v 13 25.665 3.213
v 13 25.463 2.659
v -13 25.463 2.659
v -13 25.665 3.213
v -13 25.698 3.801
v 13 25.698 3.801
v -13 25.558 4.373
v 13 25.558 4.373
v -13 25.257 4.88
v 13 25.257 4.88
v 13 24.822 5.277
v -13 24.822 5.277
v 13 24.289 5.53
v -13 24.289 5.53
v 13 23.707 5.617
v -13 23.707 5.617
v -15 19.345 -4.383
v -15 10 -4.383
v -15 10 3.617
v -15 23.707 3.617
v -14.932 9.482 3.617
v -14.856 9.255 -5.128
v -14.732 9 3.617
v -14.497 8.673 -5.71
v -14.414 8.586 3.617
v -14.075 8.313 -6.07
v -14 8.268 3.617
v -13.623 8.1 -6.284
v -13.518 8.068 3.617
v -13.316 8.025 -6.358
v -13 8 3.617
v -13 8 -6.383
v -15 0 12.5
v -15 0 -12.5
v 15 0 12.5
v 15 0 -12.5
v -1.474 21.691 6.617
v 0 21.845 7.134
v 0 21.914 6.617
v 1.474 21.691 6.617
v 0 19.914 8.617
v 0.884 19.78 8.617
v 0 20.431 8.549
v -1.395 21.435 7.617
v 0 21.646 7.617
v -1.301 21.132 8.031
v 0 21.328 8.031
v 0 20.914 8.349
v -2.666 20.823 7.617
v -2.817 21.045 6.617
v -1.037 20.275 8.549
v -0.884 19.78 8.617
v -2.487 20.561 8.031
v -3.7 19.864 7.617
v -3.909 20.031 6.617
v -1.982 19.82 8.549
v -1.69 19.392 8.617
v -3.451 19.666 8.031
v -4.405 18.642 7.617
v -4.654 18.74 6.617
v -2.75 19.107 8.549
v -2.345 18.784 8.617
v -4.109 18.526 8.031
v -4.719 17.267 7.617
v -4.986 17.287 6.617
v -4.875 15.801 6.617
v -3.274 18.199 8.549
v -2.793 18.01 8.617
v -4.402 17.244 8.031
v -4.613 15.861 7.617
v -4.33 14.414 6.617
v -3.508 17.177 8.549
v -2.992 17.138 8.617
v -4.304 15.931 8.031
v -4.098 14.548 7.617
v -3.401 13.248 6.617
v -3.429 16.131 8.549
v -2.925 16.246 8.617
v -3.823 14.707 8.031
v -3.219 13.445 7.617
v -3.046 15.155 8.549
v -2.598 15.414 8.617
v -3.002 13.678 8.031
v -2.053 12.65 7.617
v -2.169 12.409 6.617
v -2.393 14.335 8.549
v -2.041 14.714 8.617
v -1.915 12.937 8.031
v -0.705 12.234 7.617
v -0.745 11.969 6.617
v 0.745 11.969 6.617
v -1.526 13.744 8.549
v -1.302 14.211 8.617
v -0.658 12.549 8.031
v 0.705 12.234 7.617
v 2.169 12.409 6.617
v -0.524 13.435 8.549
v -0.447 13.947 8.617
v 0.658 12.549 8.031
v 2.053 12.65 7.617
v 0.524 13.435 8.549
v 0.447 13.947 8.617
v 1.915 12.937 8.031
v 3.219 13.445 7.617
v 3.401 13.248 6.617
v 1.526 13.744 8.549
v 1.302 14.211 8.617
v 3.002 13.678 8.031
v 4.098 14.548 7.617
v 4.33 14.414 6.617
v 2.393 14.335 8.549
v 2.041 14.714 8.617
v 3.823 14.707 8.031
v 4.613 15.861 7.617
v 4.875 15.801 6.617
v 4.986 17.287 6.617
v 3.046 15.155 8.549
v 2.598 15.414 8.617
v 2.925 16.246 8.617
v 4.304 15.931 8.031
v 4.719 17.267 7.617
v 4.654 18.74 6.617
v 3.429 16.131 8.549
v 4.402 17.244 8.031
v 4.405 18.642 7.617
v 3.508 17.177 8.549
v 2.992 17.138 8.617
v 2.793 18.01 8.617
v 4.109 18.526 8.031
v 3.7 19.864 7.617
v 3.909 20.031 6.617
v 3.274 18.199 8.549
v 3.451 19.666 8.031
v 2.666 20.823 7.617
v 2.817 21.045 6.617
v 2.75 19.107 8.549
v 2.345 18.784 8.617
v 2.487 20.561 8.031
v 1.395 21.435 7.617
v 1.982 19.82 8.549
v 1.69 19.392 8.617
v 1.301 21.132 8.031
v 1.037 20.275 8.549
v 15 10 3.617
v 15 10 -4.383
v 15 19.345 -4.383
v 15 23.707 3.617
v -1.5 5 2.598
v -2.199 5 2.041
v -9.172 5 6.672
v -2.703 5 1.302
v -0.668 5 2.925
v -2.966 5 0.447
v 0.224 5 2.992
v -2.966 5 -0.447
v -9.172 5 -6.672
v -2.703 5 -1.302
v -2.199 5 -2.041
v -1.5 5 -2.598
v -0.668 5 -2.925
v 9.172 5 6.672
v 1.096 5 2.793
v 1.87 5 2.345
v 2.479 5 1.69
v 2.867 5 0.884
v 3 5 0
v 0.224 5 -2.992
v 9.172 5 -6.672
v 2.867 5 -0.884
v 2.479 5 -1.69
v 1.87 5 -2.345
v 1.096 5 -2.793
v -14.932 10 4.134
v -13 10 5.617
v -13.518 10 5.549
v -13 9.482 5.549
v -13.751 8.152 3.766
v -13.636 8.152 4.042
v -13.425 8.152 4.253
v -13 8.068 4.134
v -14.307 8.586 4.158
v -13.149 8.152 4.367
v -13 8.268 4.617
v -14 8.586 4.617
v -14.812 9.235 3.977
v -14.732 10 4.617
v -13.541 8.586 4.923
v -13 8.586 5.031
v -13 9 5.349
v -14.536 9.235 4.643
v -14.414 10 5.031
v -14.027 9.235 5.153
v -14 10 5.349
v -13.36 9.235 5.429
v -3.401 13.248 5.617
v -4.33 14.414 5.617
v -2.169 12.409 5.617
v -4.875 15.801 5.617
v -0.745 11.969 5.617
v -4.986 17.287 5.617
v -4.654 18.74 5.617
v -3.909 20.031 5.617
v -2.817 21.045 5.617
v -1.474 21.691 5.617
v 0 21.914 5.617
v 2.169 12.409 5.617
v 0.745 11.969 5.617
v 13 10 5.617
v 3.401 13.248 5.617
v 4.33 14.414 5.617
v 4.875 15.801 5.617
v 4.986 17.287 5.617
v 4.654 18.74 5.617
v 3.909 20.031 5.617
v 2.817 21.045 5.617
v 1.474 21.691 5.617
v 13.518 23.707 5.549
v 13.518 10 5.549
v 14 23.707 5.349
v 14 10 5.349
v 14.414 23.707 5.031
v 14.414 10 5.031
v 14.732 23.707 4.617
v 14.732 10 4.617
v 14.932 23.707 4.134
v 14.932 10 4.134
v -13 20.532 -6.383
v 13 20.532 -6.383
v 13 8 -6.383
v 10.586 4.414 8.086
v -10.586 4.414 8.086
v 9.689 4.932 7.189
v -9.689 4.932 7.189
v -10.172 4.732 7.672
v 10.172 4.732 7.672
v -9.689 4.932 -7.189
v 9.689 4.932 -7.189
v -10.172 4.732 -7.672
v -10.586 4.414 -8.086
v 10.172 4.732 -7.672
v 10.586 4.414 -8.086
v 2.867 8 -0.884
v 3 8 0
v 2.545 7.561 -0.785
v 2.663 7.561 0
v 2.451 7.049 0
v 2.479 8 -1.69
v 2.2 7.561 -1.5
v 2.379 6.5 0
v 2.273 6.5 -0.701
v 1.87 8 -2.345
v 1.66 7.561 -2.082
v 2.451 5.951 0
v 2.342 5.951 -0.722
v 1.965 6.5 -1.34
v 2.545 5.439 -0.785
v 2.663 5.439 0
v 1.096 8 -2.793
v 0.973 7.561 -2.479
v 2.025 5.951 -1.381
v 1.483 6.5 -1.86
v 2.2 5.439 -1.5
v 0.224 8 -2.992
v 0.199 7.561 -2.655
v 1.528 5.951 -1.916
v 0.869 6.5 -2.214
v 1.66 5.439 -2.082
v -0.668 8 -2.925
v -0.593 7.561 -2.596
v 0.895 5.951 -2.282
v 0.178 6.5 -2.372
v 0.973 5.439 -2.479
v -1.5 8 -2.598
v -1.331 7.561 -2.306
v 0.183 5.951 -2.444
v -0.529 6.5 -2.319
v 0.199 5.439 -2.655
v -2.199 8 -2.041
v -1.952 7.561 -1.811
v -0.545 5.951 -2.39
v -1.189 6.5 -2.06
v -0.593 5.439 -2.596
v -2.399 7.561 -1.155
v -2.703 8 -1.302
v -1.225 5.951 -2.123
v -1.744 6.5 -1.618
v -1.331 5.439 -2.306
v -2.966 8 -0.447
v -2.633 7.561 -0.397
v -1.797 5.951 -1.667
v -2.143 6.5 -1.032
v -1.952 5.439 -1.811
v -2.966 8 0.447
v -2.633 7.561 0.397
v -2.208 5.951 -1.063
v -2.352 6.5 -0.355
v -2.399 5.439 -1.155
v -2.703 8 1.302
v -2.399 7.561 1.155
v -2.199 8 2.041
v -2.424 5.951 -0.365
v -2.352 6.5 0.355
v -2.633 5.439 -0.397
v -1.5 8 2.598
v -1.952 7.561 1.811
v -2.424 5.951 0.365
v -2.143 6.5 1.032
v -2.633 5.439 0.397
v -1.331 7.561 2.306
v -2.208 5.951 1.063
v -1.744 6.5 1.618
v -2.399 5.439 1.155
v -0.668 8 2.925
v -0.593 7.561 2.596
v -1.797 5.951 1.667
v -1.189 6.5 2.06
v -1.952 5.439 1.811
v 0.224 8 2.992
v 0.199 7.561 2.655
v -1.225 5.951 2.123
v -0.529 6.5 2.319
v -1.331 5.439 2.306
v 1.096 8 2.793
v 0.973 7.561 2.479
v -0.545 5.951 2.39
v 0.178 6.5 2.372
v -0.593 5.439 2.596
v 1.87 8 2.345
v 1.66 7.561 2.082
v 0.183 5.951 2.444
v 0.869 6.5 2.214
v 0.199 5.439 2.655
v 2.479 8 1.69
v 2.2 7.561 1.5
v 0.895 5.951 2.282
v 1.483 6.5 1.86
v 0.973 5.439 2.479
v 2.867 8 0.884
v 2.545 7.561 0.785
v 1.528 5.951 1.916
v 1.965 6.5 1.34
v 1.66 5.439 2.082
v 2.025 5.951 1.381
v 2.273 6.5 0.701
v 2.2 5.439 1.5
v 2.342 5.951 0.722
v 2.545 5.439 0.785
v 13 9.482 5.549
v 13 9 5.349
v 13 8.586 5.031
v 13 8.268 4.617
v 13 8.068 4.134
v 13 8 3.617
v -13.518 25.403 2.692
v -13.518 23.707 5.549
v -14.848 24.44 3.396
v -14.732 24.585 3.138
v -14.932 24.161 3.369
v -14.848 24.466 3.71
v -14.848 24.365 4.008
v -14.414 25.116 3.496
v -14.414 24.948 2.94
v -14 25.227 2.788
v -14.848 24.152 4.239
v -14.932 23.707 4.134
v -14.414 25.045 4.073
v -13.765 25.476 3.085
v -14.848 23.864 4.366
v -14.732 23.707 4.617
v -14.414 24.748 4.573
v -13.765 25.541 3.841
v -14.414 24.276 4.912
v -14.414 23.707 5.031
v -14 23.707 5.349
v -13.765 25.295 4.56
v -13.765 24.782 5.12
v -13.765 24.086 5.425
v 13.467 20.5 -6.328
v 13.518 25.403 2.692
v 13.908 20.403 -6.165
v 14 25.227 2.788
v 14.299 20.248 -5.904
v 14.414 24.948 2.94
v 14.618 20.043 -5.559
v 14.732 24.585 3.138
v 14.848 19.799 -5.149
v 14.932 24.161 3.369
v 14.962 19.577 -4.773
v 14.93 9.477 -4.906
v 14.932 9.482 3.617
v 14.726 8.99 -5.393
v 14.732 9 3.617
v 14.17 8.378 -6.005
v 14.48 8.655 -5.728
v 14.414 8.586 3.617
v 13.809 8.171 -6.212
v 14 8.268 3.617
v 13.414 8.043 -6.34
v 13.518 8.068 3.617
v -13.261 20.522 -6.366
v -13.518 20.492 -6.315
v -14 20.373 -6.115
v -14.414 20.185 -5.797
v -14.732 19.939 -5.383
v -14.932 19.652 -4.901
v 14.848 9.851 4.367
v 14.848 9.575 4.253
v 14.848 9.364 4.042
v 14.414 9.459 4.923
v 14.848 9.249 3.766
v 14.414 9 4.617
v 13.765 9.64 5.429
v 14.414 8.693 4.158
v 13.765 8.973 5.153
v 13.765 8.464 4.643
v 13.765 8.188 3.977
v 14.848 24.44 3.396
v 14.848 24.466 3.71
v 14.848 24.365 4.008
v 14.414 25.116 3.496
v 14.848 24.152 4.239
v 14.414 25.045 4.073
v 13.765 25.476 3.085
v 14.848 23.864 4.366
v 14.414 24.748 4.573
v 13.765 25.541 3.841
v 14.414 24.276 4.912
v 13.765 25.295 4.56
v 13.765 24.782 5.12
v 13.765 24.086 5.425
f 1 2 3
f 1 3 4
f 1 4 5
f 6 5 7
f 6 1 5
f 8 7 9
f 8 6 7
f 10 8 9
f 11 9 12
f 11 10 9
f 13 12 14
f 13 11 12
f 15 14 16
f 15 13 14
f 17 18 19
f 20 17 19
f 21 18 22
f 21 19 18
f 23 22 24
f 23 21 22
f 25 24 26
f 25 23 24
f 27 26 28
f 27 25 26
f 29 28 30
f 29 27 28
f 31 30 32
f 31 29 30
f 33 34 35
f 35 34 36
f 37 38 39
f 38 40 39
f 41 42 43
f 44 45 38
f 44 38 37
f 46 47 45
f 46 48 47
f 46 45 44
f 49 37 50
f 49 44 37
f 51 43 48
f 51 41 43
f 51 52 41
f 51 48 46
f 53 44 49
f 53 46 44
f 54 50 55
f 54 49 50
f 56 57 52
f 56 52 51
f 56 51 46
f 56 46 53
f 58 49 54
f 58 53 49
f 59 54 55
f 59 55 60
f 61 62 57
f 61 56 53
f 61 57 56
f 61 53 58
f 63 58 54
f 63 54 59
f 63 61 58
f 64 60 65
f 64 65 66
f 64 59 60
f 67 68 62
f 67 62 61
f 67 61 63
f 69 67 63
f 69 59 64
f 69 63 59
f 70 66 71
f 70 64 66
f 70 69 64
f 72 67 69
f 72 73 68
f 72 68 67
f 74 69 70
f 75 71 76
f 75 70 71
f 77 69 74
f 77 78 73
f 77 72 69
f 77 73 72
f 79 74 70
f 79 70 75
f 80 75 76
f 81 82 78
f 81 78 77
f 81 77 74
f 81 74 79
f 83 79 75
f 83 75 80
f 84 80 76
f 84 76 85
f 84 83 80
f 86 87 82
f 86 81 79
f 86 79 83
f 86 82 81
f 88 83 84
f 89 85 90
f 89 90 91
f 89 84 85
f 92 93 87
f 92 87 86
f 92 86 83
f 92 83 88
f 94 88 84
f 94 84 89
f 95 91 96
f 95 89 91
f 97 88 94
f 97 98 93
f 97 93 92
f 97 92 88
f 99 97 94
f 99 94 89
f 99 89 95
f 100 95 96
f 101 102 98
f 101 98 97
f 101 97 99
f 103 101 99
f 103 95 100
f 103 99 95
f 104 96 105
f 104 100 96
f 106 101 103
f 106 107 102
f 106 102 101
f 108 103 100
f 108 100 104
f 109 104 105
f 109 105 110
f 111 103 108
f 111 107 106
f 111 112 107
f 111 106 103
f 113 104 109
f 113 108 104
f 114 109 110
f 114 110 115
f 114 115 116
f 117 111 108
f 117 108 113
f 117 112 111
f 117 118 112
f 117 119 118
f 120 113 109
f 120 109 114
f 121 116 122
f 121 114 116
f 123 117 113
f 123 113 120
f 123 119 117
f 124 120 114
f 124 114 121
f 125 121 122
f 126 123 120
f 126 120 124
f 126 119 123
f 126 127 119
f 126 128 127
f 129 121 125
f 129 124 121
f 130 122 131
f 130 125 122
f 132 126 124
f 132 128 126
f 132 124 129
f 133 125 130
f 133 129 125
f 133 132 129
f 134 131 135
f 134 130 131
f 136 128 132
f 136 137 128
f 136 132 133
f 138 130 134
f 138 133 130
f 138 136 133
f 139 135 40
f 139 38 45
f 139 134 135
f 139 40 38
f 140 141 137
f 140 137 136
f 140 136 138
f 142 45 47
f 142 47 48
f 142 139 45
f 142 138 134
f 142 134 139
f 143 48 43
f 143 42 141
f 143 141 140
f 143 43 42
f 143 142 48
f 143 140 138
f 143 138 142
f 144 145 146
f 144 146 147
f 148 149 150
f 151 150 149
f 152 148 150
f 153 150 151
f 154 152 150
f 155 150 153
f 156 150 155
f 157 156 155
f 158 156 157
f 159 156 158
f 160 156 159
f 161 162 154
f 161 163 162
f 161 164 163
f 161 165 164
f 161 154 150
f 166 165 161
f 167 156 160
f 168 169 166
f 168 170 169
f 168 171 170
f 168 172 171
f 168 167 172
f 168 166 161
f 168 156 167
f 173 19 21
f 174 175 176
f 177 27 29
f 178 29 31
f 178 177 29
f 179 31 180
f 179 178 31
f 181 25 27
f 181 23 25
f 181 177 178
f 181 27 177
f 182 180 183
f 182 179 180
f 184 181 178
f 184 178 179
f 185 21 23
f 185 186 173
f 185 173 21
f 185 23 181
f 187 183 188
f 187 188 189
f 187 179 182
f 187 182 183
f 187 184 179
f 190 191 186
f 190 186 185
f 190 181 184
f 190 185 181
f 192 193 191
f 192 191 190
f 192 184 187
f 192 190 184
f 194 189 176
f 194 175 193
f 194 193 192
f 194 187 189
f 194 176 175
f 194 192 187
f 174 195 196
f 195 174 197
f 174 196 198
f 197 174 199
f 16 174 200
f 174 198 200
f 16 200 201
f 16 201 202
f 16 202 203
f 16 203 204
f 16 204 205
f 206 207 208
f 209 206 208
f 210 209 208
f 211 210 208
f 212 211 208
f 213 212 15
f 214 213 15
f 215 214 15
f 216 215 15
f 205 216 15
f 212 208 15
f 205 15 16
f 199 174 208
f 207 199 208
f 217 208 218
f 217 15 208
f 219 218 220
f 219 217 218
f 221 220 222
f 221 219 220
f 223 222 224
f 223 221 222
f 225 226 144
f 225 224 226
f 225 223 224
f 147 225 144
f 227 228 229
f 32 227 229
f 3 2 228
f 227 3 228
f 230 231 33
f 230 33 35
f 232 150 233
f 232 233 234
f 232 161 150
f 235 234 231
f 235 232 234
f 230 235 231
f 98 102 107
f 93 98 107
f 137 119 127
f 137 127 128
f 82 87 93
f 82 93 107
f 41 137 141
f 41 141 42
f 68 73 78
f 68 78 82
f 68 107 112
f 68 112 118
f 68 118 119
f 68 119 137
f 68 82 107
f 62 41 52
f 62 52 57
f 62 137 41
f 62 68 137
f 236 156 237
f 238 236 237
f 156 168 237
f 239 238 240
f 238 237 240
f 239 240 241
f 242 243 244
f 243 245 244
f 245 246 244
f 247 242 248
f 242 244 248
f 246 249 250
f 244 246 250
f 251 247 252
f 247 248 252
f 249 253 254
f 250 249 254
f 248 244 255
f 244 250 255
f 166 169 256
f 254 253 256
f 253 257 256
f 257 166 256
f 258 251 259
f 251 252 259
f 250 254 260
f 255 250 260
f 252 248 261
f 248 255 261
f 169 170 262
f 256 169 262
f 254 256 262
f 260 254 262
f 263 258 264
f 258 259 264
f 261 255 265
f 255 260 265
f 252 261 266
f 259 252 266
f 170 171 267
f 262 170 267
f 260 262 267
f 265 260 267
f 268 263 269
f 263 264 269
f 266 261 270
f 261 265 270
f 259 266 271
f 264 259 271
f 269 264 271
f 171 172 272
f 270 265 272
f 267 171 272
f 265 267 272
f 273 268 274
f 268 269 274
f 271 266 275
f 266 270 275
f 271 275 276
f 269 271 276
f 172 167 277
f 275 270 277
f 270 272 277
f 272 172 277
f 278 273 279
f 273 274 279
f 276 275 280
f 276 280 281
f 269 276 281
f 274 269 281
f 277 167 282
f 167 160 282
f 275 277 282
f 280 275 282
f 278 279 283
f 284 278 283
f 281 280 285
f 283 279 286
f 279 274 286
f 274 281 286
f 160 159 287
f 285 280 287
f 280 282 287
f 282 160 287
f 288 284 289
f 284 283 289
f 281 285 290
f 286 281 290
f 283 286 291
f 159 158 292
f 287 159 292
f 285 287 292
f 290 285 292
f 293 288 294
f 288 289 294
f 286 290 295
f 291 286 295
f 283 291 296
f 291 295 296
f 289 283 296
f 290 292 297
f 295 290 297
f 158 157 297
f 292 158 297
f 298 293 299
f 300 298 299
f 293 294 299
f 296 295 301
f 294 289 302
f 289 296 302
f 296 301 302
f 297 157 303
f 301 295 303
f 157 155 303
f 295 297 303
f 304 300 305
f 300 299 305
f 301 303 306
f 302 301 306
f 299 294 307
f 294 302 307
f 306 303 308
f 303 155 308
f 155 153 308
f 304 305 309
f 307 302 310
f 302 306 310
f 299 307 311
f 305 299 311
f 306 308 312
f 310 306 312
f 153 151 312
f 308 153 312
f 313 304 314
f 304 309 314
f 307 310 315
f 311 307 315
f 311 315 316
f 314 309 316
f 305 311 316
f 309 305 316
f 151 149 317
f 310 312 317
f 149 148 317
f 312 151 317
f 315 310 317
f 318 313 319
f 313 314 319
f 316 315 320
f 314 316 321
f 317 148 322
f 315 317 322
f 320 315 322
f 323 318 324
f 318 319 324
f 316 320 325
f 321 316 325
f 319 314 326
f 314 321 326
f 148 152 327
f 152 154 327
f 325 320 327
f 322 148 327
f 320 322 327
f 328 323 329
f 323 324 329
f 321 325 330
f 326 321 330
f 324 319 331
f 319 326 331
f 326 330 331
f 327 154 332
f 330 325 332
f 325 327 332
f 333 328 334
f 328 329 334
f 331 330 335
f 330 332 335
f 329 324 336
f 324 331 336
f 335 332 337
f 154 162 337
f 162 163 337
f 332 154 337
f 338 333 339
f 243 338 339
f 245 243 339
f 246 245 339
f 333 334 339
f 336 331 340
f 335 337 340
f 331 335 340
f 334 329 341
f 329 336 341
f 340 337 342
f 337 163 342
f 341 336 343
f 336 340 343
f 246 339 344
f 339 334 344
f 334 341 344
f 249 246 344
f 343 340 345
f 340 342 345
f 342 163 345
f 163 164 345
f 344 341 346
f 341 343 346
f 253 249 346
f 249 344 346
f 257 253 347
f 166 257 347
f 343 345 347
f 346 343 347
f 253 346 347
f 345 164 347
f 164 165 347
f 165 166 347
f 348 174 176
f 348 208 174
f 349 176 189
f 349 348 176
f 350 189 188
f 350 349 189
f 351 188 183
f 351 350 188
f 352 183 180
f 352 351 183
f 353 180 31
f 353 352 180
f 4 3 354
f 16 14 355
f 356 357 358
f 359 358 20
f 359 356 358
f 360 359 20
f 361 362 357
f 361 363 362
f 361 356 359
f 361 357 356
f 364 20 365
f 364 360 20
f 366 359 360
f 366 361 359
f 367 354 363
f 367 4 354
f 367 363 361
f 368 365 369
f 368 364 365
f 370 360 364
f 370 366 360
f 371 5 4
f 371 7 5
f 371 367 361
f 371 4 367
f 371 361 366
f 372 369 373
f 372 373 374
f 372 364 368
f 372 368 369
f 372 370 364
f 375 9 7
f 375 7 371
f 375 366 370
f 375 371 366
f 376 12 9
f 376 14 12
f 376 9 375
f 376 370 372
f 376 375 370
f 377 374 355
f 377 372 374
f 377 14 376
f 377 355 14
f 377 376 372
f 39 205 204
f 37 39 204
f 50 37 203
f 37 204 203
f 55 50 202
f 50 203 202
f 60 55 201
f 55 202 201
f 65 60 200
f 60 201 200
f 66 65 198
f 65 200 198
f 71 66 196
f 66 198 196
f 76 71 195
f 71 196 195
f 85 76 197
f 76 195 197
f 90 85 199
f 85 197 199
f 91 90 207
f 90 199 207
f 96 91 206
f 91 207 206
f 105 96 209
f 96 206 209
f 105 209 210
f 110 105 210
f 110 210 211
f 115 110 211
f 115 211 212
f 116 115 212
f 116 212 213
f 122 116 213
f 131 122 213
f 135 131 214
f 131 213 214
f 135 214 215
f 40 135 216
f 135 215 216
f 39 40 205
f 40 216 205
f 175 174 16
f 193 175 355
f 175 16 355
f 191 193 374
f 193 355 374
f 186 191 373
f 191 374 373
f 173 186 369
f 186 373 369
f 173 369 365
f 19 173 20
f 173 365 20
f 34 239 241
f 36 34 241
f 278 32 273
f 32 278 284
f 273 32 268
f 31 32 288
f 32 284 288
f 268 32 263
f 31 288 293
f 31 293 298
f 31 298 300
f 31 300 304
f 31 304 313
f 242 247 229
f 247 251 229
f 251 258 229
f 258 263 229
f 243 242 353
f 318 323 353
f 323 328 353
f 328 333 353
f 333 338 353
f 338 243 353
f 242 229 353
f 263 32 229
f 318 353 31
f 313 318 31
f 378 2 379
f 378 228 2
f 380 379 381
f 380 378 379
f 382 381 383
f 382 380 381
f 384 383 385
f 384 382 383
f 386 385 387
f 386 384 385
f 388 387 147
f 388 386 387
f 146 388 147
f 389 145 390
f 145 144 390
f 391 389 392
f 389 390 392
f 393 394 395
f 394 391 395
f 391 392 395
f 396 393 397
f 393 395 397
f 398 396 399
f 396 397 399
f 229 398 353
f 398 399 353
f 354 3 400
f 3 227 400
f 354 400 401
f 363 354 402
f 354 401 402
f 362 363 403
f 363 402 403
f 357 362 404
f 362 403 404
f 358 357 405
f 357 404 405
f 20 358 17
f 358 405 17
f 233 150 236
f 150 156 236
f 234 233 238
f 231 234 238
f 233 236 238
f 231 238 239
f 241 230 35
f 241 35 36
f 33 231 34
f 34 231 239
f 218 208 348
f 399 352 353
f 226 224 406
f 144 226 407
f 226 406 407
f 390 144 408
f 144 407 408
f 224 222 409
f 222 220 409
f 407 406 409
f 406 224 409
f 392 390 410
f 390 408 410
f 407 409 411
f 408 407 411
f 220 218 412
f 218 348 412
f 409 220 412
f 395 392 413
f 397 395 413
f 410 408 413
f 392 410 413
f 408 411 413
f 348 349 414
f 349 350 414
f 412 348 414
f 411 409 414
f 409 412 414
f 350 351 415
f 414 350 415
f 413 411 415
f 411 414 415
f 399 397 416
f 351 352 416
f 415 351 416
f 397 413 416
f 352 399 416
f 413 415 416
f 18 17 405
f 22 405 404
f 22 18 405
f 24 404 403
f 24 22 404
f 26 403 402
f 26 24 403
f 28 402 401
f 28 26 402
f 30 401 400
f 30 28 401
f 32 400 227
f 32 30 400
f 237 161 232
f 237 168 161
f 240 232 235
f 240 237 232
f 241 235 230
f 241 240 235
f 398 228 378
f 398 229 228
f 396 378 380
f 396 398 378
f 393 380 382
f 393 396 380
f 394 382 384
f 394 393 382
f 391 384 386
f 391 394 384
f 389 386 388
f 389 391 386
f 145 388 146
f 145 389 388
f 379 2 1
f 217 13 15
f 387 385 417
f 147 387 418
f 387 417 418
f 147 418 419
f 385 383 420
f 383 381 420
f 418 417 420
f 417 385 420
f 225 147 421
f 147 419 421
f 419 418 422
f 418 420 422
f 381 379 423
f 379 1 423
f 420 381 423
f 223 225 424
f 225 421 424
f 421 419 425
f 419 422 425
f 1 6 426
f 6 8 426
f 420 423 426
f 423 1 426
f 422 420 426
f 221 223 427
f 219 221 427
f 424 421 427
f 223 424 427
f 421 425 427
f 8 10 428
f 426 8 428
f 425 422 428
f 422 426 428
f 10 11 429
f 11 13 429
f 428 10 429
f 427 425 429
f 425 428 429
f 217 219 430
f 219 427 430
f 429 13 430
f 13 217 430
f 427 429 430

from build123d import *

# Parameters (mm, degrees)
SKETCH1_W           = 30
SKETCH1_H           = 25
BOSS_EXTRUDE1_DEPTH = 5
CHAMFER1_SIZE       = 5
BOSS_EXTRUDE4_DEPTH = 15
FILLET3_R           = 2
FILLET4_R           = 2
SKETCH12_R          = 5
BOSS_EXTRUDE5_DEPTH = 3
FILLET5_R           = 2


with BuildPart() as part:
    # Sketch1 → Boss-Extrude1 (new body)
    with BuildSketch(Plane(origin=(0, 0, 0), x_dir=(1, 0, 0), z_dir=(0, 1, 0))):
        Rectangle(SKETCH1_W, SKETCH1_H)
    extrude(amount=BOSS_EXTRUDE1_DEPTH)

    # Chamfer1
    chamfer1_edges = [part.edges().sort_by_distance(p)[0] for p in [
        (0, 5, 12.5),
        (-15, 5, 0),
        (0, 5, -12.5),
        (15, 5, 0),
    ]]
    chamfer(chamfer1_edges, length=CHAMFER1_SIZE - 0.0001)  # a hair under: the kernel refuses the full size

    # Sketch9 → Revolve1 (revolve)
    with BuildSketch(Plane.XY):
        with BuildLine():
            Line((0, 5), (0, 8))
            Line((0, 8), (3, 8))
            ThreePointArc((3, 8), (2.378679656, 6.5), (3, 5))
            Line((3, 5), (0, 5))
        make_face()
    revolve(axis=Axis((0, 5, 0), (0, 1, 0)))

    # Sketch11 → Boss-Extrude4 (add, symmetric)
    with BuildSketch(Plane(origin=(0, 0, 0), x_dir=(0, 0, -1), z_dir=(1, 0, 0))):
        Polygon((-5.616779032, 27.075000452), (6.383220968, 20.532496755), (6.383220968, 8), (-5.616779032, 8), align=None)
    extrude(amount=BOSS_EXTRUDE4_DEPTH, both=True)

    # Fillet3
    fillet3_edges = [part.edges().sort_by_distance(p)[0] for p in [
        (-15, 14.266248378, -6.383220968),
        (-15, 23.803748604, -0.383220968),
        (-15, 17.537500226, 5.616779032),
        (0, 27.075000452, 5.616779032),
        (-15, 8, -0.383220968),
        (0, 8, 5.616779032),
        (15, 14.266248378, -6.383220968),
        (15, 23.803748604, -0.383220968),
        (15, 17.537500226, 5.616779032),
        (15, 8, -0.383220968),
    ]]
    fillet(fillet3_edges, radius=FILLET3_R)

    # Fillet4
    fillet4_edges = [part.edges().sort_by_distance(p)[0] for p in [
        (10.0001, 5, 0),
        (0, 5, -7.5001),
        (-10.0001, 5, 0),
        (0, 5, 7.5001),
    ]]
    fillet(fillet4_edges, radius=FILLET4_R)

    # Sketch12 → Boss-Extrude5 (add)
    with BuildSketch(Plane.XY.offset(5.616779032)):
        with Locations(Location((0, 16.913633245, 0), (0, 0, 90))):
            Circle(SKETCH12_R)
    extrude(amount=BOSS_EXTRUDE5_DEPTH)

    # Fillet5
    fillet5_edges = [part.edges().sort_by_distance(p)[0] for p in [
        (0, 11.913633245, 8.616779032),
    ]]
    fillet(fillet5_edges, radius=FILLET5_R)


solid = part.part
